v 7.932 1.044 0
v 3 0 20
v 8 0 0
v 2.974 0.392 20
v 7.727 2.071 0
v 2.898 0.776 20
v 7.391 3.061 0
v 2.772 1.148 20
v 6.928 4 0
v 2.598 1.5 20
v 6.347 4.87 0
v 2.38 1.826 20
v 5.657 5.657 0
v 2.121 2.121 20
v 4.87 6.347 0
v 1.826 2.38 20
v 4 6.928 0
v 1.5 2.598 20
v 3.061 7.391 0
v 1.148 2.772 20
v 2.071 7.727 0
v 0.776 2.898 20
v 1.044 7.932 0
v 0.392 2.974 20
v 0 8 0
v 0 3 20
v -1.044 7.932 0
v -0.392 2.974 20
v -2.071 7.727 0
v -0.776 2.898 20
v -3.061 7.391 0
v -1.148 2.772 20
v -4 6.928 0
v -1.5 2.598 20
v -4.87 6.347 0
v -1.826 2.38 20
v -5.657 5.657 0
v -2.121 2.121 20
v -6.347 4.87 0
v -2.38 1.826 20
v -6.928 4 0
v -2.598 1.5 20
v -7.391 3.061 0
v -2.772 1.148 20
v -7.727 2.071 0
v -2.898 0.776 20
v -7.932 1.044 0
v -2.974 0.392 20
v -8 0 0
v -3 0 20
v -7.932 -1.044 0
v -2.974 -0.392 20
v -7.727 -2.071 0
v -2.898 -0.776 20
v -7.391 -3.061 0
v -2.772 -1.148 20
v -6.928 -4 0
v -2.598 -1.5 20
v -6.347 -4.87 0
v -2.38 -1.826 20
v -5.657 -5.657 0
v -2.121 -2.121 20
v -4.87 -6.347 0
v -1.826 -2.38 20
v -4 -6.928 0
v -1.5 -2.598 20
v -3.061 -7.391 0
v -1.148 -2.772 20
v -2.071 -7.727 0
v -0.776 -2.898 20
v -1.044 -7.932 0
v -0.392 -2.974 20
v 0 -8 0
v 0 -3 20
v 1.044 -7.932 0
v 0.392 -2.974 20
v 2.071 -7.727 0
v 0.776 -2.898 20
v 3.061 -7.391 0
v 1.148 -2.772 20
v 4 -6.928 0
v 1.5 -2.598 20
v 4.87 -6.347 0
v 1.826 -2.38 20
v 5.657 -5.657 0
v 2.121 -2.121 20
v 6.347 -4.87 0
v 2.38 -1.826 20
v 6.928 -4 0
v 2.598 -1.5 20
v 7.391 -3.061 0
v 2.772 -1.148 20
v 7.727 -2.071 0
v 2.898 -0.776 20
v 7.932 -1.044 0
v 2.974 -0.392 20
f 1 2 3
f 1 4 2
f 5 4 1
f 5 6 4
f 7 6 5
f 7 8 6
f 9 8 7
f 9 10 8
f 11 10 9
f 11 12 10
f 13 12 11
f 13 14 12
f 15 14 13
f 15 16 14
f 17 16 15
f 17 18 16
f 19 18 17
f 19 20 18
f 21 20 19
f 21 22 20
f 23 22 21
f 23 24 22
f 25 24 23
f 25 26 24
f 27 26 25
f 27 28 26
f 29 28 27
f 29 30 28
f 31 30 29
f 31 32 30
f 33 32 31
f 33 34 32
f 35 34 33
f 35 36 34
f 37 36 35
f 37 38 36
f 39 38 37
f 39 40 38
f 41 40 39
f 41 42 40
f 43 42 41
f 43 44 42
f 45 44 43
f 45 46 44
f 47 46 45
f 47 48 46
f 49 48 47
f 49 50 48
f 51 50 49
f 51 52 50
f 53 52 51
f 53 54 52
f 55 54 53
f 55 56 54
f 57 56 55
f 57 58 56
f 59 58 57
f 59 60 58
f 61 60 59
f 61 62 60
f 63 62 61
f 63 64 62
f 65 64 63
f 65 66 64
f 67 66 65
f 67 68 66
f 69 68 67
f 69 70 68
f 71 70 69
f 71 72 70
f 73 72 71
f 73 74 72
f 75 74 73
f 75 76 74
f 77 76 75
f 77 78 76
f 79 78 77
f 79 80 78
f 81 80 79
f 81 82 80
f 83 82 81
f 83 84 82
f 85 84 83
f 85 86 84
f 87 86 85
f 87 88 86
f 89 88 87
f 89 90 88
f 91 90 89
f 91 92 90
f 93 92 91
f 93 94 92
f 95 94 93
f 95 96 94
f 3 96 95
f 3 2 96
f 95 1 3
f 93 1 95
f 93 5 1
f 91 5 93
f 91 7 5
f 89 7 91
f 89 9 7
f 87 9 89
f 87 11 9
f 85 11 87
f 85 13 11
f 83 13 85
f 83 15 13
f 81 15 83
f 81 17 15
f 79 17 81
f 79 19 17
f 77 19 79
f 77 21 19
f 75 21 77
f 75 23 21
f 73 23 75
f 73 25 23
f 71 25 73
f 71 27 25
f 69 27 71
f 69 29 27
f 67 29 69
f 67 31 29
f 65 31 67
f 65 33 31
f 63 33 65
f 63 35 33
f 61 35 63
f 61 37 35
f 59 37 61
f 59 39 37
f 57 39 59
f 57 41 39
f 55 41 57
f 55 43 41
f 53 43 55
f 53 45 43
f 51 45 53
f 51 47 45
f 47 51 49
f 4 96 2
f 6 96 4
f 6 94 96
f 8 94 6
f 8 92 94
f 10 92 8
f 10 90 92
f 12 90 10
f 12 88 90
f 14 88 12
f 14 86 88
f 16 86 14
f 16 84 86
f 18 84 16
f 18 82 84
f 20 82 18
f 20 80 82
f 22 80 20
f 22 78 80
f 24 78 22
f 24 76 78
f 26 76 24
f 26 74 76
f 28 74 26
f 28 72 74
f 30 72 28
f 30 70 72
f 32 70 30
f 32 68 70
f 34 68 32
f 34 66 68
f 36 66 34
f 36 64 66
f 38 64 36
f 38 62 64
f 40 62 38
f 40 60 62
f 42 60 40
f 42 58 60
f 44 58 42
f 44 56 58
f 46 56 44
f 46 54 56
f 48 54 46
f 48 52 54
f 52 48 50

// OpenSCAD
// Construct: cylinder() as a truncated cone via r1 / r2.
cylinder(h = 20, r1 = 8, r2 = 3, $fn = 48);
